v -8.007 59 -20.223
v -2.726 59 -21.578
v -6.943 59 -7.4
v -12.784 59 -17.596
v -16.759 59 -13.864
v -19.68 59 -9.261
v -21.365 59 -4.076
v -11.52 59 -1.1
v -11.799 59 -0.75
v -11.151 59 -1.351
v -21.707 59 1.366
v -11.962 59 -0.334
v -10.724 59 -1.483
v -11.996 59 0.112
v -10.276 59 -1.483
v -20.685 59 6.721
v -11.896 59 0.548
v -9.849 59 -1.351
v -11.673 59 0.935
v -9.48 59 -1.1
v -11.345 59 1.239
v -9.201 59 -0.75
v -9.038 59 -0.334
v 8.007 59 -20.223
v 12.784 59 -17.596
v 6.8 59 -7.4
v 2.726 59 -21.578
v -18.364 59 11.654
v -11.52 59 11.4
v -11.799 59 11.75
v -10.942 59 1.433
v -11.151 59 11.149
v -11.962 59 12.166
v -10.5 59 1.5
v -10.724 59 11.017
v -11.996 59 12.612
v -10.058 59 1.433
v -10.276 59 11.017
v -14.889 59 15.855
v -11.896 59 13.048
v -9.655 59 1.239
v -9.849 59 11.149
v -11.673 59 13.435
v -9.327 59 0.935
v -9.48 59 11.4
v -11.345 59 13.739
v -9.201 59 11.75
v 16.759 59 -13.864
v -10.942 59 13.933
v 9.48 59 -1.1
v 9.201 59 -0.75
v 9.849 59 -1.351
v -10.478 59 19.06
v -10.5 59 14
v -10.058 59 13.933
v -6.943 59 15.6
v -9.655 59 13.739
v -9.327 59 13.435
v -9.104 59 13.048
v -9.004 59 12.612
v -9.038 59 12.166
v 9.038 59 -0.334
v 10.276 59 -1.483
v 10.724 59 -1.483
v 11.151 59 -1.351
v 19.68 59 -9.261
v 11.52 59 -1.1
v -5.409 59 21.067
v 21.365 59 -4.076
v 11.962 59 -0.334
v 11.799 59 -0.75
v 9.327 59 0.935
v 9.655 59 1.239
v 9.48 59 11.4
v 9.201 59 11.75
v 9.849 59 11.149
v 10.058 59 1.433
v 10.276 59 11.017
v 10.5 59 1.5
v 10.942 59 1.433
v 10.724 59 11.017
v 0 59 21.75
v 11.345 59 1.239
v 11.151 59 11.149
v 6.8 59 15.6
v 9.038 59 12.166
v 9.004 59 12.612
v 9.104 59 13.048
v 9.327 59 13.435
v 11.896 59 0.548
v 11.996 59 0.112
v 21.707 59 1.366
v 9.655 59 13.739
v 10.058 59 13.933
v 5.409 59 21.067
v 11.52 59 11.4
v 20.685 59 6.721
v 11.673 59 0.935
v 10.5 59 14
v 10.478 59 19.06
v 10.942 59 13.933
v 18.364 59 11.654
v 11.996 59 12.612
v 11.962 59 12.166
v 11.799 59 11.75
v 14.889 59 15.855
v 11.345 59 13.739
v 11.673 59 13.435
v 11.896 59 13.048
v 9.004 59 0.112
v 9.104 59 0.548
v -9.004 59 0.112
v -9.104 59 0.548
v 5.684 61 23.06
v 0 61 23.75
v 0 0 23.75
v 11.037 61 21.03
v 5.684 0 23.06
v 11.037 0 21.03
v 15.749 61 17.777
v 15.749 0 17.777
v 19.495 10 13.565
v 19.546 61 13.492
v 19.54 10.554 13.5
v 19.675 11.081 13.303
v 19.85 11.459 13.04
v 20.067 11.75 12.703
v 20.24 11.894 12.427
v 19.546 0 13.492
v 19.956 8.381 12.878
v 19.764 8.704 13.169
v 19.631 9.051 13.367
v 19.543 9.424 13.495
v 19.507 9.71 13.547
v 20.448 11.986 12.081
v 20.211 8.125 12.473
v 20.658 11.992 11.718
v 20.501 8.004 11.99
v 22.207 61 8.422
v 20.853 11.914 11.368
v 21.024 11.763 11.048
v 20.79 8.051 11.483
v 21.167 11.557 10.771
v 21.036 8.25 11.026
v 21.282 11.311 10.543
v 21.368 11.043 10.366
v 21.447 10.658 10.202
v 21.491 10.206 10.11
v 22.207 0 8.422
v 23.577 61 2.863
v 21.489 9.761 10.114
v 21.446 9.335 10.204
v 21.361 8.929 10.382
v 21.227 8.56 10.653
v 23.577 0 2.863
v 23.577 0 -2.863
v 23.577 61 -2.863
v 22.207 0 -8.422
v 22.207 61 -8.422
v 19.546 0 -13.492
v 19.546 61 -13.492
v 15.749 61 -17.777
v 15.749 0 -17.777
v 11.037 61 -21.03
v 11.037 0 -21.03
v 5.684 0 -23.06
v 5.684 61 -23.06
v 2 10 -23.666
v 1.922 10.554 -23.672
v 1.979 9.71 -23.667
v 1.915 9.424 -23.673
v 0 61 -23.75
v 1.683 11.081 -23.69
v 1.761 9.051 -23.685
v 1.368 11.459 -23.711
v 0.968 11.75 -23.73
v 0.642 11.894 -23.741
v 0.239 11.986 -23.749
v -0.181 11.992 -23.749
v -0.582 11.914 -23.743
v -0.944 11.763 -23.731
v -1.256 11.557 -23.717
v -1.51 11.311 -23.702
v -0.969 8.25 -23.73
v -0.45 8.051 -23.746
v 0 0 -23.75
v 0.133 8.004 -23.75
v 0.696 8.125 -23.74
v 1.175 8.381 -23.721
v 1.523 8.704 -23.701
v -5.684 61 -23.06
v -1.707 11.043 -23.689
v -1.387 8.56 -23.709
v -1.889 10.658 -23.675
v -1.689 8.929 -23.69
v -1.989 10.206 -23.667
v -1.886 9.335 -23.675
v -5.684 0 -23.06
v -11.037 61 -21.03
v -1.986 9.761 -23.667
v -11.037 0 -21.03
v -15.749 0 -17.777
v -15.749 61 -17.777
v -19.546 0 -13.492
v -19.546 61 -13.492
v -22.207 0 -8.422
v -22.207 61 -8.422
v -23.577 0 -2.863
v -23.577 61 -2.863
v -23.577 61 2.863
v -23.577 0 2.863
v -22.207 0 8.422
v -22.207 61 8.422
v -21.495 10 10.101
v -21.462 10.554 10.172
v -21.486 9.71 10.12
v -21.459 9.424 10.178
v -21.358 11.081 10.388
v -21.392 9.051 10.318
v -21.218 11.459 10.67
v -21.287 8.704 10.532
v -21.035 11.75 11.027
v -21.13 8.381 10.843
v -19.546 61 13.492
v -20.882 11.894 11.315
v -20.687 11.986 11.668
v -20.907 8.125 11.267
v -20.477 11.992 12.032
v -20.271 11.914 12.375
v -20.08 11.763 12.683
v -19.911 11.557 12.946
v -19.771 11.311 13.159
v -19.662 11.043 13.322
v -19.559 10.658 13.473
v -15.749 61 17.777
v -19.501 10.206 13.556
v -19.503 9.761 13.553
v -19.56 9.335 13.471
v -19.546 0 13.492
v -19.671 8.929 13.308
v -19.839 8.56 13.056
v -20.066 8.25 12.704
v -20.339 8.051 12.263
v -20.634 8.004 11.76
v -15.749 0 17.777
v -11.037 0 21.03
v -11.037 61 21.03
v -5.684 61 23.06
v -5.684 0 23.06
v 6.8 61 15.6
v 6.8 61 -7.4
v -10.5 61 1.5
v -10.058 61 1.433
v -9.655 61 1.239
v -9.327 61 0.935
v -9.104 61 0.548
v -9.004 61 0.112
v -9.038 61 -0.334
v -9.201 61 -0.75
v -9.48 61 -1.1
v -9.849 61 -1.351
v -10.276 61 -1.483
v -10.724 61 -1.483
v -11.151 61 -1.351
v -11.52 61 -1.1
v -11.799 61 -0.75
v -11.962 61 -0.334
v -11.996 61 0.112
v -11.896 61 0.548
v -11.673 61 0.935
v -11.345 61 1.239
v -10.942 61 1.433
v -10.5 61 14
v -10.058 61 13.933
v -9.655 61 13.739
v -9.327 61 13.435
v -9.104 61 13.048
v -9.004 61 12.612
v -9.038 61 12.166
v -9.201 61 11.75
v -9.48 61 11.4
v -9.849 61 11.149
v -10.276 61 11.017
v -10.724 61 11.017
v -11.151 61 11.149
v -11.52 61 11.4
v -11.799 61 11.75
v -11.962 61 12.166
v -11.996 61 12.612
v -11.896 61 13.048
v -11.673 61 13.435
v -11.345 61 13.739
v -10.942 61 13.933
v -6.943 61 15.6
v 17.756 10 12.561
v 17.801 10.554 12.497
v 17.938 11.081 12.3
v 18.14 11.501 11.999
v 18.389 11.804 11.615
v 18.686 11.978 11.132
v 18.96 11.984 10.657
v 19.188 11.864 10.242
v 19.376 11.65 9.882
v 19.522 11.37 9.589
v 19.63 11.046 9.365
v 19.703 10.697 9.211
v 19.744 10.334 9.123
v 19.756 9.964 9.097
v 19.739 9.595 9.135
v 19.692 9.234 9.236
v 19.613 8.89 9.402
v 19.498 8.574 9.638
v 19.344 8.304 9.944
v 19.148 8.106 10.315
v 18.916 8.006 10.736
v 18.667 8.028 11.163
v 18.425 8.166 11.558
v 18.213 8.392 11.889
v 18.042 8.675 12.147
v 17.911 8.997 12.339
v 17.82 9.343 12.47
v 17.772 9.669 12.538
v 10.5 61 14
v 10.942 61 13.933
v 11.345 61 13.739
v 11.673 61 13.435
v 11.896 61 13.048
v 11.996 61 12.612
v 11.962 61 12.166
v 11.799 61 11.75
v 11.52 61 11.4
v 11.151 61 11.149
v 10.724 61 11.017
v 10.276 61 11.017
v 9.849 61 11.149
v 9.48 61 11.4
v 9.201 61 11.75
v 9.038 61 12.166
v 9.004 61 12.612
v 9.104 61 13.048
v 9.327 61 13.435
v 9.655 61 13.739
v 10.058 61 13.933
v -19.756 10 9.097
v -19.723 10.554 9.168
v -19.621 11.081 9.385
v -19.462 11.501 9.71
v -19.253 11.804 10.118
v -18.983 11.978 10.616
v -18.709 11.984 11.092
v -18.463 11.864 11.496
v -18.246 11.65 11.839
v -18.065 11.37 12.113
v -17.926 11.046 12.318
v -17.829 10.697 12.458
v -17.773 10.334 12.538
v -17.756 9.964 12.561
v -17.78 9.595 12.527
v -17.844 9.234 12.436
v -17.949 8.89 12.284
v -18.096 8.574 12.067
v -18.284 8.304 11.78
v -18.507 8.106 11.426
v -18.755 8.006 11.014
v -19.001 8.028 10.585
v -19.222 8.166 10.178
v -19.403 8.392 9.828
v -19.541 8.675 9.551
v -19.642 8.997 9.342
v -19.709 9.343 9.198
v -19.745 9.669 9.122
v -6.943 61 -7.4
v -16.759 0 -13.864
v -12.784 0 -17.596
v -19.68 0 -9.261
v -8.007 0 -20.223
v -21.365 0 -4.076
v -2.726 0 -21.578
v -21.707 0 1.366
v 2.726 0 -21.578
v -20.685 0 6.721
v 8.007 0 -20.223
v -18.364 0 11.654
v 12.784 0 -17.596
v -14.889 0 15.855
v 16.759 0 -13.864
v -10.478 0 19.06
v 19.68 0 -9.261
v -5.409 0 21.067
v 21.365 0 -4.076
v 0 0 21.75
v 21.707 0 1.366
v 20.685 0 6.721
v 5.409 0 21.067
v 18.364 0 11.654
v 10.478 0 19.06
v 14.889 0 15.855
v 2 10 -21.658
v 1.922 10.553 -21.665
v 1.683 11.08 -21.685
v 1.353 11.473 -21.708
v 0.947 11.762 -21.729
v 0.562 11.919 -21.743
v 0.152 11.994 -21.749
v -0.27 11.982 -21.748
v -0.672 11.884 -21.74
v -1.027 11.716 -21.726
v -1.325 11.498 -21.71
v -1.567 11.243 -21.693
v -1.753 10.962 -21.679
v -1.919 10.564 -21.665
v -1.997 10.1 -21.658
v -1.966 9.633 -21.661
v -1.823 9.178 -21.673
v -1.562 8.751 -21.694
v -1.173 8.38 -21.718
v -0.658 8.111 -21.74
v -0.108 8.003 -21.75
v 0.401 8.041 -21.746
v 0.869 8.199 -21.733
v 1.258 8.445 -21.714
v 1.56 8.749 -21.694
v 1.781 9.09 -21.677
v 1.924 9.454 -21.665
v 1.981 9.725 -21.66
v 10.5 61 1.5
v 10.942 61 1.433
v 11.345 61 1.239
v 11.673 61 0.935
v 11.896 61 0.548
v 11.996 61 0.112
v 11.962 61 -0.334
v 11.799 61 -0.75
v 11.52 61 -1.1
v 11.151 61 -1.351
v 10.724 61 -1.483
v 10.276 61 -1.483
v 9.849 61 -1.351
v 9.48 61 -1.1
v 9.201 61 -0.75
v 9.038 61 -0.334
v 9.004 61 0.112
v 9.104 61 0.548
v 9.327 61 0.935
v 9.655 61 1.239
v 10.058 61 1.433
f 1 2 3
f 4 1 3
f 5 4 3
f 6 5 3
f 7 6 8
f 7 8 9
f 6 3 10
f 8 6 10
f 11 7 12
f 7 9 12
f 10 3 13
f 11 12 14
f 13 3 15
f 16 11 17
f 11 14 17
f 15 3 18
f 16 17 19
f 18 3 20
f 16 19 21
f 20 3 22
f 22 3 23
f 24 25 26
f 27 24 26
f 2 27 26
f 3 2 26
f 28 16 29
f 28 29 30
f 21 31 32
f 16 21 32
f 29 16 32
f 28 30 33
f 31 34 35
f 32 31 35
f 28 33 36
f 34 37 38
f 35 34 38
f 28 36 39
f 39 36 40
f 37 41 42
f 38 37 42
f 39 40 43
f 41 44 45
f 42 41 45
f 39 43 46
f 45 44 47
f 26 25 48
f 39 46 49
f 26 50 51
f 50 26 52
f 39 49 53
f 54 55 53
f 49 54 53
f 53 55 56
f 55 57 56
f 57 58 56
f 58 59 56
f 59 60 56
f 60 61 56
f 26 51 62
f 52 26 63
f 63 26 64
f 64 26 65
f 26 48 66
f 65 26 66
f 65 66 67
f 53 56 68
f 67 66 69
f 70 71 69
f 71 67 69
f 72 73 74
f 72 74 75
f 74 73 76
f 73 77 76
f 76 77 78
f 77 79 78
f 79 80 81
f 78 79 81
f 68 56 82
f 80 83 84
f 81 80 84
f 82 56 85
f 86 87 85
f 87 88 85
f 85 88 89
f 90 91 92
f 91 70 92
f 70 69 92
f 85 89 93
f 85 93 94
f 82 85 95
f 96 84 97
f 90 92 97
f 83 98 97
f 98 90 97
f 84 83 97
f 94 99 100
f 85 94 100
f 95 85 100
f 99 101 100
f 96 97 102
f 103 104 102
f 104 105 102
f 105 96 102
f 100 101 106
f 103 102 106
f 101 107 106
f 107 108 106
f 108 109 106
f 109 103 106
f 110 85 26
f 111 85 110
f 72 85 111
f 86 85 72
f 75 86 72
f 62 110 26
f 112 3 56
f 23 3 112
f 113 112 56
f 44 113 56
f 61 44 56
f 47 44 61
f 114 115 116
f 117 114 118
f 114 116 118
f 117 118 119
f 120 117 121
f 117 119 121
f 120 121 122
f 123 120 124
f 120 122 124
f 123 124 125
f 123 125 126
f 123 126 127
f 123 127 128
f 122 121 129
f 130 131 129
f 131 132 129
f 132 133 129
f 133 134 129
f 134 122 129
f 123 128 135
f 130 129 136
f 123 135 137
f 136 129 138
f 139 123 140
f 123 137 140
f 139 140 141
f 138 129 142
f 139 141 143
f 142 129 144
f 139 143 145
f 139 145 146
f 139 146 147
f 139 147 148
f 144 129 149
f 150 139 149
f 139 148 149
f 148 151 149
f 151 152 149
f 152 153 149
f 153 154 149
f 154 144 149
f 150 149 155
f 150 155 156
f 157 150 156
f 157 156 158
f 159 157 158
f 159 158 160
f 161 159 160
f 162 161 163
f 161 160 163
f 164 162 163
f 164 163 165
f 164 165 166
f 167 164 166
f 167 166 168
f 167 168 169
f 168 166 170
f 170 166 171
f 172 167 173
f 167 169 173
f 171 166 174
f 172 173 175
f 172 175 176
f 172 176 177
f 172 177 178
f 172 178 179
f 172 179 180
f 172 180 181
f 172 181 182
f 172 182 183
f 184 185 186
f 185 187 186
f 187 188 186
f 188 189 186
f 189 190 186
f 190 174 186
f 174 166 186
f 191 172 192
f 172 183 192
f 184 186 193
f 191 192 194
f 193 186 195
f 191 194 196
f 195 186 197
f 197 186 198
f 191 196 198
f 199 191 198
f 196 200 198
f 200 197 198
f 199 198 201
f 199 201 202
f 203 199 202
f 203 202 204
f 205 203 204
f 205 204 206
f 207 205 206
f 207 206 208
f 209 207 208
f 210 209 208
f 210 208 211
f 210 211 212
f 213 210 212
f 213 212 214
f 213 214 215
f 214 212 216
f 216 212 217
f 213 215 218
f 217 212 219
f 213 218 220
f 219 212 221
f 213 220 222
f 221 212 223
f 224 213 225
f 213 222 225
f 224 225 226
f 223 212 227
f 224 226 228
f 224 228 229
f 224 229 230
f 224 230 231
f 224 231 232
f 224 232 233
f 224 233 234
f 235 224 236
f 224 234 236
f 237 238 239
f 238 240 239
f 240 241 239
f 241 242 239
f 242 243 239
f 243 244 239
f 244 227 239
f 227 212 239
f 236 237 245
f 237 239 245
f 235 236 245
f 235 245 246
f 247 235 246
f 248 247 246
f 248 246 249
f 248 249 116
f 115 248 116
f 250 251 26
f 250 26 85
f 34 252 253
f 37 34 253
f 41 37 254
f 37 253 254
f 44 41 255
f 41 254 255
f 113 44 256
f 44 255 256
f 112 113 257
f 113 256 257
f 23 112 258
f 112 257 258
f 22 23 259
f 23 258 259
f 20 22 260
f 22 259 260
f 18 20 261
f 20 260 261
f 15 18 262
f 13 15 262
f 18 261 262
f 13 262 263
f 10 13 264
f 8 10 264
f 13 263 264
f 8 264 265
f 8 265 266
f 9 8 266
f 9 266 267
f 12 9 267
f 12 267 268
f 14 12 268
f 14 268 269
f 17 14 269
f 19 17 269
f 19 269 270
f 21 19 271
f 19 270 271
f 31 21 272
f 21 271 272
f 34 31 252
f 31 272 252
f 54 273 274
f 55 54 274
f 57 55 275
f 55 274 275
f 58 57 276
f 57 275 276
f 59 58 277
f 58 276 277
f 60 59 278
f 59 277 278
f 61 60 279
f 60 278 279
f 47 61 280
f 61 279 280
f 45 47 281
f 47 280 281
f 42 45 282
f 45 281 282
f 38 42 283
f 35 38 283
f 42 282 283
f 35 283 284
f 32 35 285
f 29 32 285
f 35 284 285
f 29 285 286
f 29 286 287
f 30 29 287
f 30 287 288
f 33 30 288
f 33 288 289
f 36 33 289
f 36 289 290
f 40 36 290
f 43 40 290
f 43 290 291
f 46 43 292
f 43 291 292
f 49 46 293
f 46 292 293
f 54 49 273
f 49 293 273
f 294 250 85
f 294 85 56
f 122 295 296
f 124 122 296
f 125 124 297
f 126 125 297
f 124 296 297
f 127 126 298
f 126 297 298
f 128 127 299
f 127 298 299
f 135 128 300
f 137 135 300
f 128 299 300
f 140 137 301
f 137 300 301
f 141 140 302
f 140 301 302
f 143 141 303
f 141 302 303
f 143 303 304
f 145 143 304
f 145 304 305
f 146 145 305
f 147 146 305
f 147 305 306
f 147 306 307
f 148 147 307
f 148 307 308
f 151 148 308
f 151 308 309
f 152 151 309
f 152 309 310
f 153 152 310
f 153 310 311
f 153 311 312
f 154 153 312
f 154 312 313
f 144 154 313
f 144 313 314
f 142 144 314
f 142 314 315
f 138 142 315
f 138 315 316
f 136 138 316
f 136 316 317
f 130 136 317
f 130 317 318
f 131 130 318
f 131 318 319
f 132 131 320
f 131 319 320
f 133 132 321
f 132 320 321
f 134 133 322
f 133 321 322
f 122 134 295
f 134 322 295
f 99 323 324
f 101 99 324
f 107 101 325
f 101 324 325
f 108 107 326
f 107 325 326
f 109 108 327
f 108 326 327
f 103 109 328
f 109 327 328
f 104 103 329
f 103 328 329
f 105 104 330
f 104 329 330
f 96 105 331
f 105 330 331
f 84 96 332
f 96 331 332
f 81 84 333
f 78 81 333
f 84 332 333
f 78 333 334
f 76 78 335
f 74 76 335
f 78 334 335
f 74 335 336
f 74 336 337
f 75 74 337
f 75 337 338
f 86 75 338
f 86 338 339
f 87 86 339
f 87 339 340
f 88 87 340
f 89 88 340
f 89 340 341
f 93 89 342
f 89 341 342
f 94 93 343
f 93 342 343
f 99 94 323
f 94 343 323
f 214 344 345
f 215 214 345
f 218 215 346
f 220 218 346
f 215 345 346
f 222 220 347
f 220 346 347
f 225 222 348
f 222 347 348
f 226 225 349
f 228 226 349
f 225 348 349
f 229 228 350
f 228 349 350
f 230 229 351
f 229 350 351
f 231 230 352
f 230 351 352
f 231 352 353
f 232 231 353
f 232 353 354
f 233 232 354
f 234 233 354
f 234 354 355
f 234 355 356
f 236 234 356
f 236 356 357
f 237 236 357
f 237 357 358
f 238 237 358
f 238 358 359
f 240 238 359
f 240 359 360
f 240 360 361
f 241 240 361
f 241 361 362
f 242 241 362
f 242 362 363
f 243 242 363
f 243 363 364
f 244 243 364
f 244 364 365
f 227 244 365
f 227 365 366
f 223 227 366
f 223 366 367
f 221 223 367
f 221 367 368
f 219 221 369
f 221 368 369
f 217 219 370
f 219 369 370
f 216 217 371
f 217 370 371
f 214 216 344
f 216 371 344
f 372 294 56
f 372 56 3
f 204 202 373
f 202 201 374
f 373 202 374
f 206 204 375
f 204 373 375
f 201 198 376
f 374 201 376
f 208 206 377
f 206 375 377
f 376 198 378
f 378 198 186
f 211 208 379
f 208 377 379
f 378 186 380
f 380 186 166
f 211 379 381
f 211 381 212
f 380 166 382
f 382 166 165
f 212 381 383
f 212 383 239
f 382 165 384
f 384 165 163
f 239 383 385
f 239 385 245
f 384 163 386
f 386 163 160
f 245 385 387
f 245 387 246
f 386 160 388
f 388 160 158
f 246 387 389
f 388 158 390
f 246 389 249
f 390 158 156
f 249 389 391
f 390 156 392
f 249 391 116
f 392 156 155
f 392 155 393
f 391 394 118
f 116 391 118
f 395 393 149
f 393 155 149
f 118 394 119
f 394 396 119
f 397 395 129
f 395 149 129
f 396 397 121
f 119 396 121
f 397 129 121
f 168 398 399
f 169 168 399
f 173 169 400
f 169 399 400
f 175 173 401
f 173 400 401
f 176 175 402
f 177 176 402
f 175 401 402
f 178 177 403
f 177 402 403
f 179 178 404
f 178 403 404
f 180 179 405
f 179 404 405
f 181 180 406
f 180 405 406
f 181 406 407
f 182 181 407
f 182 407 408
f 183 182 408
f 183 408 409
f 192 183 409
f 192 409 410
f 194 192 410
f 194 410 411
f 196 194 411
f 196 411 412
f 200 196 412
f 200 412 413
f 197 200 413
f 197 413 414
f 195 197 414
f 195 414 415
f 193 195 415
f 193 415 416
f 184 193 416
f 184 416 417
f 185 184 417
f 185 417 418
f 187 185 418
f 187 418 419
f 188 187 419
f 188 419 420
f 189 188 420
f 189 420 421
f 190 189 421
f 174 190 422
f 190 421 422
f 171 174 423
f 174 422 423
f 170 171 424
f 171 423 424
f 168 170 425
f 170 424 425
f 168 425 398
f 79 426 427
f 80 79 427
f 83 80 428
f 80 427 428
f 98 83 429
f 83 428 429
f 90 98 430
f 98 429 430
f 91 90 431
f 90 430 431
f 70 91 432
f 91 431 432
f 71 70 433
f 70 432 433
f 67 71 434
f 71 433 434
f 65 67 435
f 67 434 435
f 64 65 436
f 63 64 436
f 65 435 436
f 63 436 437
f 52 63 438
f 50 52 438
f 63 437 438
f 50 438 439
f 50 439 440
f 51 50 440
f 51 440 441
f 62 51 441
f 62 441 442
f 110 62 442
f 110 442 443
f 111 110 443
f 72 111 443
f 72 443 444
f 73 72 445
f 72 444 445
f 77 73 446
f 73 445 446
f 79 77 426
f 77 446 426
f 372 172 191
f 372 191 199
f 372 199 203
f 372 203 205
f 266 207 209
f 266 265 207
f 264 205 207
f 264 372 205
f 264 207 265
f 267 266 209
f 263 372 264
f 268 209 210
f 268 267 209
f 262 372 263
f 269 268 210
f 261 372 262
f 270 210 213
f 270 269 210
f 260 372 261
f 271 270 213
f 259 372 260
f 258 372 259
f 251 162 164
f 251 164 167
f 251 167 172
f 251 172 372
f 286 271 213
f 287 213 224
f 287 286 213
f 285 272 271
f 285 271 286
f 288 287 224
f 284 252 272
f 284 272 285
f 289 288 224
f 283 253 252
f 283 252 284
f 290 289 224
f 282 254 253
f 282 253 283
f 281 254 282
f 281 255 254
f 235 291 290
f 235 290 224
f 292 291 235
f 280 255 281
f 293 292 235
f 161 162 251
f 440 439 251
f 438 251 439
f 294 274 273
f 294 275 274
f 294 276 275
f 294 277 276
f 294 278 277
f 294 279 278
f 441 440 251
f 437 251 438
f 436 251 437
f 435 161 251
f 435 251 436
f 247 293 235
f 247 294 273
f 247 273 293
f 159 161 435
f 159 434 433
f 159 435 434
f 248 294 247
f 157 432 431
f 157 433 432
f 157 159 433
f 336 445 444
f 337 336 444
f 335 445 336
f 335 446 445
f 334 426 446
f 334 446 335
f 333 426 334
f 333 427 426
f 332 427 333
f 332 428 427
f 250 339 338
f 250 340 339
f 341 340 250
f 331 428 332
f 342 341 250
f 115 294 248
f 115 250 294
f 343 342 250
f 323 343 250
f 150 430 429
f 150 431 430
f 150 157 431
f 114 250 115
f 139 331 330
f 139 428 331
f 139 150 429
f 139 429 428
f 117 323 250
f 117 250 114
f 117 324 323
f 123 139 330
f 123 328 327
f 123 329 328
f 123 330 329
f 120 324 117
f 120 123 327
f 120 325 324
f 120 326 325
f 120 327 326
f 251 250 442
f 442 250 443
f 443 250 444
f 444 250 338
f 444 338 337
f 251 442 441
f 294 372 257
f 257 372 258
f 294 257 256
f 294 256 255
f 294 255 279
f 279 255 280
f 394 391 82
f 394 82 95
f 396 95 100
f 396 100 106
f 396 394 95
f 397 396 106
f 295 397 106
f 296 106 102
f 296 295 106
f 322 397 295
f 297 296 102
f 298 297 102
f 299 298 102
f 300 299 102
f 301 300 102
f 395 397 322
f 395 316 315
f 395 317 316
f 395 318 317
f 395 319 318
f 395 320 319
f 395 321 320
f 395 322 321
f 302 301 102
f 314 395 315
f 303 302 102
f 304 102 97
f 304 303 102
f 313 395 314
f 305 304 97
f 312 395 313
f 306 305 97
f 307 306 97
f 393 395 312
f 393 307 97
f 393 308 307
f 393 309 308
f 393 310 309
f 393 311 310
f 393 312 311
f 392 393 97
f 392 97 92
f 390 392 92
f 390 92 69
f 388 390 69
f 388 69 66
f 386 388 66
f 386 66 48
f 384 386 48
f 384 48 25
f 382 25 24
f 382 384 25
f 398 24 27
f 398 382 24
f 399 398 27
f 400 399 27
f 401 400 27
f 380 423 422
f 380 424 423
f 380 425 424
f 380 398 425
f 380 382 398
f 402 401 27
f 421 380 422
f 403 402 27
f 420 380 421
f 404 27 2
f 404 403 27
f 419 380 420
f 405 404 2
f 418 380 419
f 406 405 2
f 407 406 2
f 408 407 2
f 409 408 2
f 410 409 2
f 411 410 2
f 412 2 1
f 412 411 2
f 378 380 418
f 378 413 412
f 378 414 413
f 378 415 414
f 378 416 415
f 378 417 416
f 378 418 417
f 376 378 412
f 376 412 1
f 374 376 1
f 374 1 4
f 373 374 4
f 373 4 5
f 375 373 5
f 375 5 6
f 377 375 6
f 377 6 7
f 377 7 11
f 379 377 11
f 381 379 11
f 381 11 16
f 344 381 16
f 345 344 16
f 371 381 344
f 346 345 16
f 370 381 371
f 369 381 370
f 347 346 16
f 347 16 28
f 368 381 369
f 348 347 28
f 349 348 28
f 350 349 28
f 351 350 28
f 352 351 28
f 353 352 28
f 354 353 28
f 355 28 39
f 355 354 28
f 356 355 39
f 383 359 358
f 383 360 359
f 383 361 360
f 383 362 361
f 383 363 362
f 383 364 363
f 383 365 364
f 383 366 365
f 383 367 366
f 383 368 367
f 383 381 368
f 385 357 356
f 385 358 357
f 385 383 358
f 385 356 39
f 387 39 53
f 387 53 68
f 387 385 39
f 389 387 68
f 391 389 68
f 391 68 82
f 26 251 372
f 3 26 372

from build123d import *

# Parameters (mm, degrees)
SKETCH1_R               = 23.75
SKETCH1_R_2             = 21.75
BOSS_EXTRUDE1_DEPTH     = 59
SKETCH2_R               = 23.75
BOSS_EXTRUDE2_DEPTH     = 2
SKETCH3_R               = 1.5
CUT_EXTRUDE1_DEPTH      = 2
CUT_EXTRUDE2_REACH      = 71.636
CUT_EXTRUDE2_END_RADIUS = 23.75
SKETCH4_R               = 2
CIRPATTERN1_COUNT       = 3


with BuildPart() as part:
    # Sketch1 → Boss-Extrude1 (new body)
    with BuildSketch(Plane(origin=(0, 0, 0), x_dir=(1, 0, 0), z_dir=(0, 1, 0))):
        with Locations(Location((0, 0, 0), (0, 0, 270))):
            Circle(SKETCH1_R)
        with Locations(Location((0, 0, 0), (0, 0, 270))):
            Circle(SKETCH1_R_2, mode=Mode.SUBTRACT)
    extrude(amount=BOSS_EXTRUDE1_DEPTH)

    # Sketch2 → Boss-Extrude2 (add)
    with BuildSketch(Plane(origin=(0, 59, 0), x_dir=(1, 0, 0), z_dir=(0, 1, 0))):
        with Locations(Location((0, 0, 0), (0, 0, 270))):
            Circle(SKETCH2_R)
    extrude(amount=BOSS_EXTRUDE2_DEPTH)

    # Sketch3 → Cut-Extrude1 (cut)
    with BuildSketch(Plane(origin=(0, 61, 0), x_dir=(1, 0, 0), z_dir=(0, 1, 0))):
        with Locations(Location((-10.5, 0, 0), (0, 0, 270))):
            Circle(SKETCH3_R)
        with Locations(Location((10.5, 0, 0), (0, 0, 270))):
            Circle(SKETCH3_R)
        with Locations(Location((-10.5, -12.5, 0), (0, 0, 270))):
            Circle(SKETCH3_R)
        with Locations(Location((10.5, -12.5, 0), (0, 0, 270))):
            Circle(SKETCH3_R)
        Polygon((0, 7.4), (6.8, 7.4), (6.8, -15.6), (-6.94269124, -15.6), (-6.94269124, 7.4), align=None)
    extrude(amount=-CUT_EXTRUDE1_DEPTH, mode=Mode.SUBTRACT)

    # Cut-Extrude2: up to this cylinder (the profile starts inside it)
    cut_extrude2_end = Plane(origin=(0, 10, 0), z_dir=(0, -1, 0)) * Cylinder(CUT_EXTRUDE2_END_RADIUS, 191.772, mode=Mode.PRIVATE)
    # Sketch4 → Cut-Extrude2 (cut, up to the surface)
    with BuildSketch(Plane.XY, mode=Mode.PRIVATE) as cut_extrude2_sk1:
        with Locations((0, 10)):
            Circle(SKETCH4_R)
    cut_extrude2_tool1 = extrude(cut_extrude2_sk1.sketch, amount=-CUT_EXTRUDE2_REACH, mode=Mode.PRIVATE) & cut_extrude2_end
    cut_extrude2 = cut_extrude2_tool1.solids().sort_by_distance((0, 10, 0))[0]
    add(cut_extrude2, mode=Mode.SUBTRACT)

    # CirPattern1: Cut-Extrude2 ×3 about axis
    cirpattern1_axis = Axis((0, 59, 0), (0, -1, 0))
    for i in range(1, CIRPATTERN1_COUNT):
        add(cut_extrude2.rotate(cirpattern1_axis, i * 360 / CIRPATTERN1_COUNT), mode=Mode.SUBTRACT)


solid = part.part
